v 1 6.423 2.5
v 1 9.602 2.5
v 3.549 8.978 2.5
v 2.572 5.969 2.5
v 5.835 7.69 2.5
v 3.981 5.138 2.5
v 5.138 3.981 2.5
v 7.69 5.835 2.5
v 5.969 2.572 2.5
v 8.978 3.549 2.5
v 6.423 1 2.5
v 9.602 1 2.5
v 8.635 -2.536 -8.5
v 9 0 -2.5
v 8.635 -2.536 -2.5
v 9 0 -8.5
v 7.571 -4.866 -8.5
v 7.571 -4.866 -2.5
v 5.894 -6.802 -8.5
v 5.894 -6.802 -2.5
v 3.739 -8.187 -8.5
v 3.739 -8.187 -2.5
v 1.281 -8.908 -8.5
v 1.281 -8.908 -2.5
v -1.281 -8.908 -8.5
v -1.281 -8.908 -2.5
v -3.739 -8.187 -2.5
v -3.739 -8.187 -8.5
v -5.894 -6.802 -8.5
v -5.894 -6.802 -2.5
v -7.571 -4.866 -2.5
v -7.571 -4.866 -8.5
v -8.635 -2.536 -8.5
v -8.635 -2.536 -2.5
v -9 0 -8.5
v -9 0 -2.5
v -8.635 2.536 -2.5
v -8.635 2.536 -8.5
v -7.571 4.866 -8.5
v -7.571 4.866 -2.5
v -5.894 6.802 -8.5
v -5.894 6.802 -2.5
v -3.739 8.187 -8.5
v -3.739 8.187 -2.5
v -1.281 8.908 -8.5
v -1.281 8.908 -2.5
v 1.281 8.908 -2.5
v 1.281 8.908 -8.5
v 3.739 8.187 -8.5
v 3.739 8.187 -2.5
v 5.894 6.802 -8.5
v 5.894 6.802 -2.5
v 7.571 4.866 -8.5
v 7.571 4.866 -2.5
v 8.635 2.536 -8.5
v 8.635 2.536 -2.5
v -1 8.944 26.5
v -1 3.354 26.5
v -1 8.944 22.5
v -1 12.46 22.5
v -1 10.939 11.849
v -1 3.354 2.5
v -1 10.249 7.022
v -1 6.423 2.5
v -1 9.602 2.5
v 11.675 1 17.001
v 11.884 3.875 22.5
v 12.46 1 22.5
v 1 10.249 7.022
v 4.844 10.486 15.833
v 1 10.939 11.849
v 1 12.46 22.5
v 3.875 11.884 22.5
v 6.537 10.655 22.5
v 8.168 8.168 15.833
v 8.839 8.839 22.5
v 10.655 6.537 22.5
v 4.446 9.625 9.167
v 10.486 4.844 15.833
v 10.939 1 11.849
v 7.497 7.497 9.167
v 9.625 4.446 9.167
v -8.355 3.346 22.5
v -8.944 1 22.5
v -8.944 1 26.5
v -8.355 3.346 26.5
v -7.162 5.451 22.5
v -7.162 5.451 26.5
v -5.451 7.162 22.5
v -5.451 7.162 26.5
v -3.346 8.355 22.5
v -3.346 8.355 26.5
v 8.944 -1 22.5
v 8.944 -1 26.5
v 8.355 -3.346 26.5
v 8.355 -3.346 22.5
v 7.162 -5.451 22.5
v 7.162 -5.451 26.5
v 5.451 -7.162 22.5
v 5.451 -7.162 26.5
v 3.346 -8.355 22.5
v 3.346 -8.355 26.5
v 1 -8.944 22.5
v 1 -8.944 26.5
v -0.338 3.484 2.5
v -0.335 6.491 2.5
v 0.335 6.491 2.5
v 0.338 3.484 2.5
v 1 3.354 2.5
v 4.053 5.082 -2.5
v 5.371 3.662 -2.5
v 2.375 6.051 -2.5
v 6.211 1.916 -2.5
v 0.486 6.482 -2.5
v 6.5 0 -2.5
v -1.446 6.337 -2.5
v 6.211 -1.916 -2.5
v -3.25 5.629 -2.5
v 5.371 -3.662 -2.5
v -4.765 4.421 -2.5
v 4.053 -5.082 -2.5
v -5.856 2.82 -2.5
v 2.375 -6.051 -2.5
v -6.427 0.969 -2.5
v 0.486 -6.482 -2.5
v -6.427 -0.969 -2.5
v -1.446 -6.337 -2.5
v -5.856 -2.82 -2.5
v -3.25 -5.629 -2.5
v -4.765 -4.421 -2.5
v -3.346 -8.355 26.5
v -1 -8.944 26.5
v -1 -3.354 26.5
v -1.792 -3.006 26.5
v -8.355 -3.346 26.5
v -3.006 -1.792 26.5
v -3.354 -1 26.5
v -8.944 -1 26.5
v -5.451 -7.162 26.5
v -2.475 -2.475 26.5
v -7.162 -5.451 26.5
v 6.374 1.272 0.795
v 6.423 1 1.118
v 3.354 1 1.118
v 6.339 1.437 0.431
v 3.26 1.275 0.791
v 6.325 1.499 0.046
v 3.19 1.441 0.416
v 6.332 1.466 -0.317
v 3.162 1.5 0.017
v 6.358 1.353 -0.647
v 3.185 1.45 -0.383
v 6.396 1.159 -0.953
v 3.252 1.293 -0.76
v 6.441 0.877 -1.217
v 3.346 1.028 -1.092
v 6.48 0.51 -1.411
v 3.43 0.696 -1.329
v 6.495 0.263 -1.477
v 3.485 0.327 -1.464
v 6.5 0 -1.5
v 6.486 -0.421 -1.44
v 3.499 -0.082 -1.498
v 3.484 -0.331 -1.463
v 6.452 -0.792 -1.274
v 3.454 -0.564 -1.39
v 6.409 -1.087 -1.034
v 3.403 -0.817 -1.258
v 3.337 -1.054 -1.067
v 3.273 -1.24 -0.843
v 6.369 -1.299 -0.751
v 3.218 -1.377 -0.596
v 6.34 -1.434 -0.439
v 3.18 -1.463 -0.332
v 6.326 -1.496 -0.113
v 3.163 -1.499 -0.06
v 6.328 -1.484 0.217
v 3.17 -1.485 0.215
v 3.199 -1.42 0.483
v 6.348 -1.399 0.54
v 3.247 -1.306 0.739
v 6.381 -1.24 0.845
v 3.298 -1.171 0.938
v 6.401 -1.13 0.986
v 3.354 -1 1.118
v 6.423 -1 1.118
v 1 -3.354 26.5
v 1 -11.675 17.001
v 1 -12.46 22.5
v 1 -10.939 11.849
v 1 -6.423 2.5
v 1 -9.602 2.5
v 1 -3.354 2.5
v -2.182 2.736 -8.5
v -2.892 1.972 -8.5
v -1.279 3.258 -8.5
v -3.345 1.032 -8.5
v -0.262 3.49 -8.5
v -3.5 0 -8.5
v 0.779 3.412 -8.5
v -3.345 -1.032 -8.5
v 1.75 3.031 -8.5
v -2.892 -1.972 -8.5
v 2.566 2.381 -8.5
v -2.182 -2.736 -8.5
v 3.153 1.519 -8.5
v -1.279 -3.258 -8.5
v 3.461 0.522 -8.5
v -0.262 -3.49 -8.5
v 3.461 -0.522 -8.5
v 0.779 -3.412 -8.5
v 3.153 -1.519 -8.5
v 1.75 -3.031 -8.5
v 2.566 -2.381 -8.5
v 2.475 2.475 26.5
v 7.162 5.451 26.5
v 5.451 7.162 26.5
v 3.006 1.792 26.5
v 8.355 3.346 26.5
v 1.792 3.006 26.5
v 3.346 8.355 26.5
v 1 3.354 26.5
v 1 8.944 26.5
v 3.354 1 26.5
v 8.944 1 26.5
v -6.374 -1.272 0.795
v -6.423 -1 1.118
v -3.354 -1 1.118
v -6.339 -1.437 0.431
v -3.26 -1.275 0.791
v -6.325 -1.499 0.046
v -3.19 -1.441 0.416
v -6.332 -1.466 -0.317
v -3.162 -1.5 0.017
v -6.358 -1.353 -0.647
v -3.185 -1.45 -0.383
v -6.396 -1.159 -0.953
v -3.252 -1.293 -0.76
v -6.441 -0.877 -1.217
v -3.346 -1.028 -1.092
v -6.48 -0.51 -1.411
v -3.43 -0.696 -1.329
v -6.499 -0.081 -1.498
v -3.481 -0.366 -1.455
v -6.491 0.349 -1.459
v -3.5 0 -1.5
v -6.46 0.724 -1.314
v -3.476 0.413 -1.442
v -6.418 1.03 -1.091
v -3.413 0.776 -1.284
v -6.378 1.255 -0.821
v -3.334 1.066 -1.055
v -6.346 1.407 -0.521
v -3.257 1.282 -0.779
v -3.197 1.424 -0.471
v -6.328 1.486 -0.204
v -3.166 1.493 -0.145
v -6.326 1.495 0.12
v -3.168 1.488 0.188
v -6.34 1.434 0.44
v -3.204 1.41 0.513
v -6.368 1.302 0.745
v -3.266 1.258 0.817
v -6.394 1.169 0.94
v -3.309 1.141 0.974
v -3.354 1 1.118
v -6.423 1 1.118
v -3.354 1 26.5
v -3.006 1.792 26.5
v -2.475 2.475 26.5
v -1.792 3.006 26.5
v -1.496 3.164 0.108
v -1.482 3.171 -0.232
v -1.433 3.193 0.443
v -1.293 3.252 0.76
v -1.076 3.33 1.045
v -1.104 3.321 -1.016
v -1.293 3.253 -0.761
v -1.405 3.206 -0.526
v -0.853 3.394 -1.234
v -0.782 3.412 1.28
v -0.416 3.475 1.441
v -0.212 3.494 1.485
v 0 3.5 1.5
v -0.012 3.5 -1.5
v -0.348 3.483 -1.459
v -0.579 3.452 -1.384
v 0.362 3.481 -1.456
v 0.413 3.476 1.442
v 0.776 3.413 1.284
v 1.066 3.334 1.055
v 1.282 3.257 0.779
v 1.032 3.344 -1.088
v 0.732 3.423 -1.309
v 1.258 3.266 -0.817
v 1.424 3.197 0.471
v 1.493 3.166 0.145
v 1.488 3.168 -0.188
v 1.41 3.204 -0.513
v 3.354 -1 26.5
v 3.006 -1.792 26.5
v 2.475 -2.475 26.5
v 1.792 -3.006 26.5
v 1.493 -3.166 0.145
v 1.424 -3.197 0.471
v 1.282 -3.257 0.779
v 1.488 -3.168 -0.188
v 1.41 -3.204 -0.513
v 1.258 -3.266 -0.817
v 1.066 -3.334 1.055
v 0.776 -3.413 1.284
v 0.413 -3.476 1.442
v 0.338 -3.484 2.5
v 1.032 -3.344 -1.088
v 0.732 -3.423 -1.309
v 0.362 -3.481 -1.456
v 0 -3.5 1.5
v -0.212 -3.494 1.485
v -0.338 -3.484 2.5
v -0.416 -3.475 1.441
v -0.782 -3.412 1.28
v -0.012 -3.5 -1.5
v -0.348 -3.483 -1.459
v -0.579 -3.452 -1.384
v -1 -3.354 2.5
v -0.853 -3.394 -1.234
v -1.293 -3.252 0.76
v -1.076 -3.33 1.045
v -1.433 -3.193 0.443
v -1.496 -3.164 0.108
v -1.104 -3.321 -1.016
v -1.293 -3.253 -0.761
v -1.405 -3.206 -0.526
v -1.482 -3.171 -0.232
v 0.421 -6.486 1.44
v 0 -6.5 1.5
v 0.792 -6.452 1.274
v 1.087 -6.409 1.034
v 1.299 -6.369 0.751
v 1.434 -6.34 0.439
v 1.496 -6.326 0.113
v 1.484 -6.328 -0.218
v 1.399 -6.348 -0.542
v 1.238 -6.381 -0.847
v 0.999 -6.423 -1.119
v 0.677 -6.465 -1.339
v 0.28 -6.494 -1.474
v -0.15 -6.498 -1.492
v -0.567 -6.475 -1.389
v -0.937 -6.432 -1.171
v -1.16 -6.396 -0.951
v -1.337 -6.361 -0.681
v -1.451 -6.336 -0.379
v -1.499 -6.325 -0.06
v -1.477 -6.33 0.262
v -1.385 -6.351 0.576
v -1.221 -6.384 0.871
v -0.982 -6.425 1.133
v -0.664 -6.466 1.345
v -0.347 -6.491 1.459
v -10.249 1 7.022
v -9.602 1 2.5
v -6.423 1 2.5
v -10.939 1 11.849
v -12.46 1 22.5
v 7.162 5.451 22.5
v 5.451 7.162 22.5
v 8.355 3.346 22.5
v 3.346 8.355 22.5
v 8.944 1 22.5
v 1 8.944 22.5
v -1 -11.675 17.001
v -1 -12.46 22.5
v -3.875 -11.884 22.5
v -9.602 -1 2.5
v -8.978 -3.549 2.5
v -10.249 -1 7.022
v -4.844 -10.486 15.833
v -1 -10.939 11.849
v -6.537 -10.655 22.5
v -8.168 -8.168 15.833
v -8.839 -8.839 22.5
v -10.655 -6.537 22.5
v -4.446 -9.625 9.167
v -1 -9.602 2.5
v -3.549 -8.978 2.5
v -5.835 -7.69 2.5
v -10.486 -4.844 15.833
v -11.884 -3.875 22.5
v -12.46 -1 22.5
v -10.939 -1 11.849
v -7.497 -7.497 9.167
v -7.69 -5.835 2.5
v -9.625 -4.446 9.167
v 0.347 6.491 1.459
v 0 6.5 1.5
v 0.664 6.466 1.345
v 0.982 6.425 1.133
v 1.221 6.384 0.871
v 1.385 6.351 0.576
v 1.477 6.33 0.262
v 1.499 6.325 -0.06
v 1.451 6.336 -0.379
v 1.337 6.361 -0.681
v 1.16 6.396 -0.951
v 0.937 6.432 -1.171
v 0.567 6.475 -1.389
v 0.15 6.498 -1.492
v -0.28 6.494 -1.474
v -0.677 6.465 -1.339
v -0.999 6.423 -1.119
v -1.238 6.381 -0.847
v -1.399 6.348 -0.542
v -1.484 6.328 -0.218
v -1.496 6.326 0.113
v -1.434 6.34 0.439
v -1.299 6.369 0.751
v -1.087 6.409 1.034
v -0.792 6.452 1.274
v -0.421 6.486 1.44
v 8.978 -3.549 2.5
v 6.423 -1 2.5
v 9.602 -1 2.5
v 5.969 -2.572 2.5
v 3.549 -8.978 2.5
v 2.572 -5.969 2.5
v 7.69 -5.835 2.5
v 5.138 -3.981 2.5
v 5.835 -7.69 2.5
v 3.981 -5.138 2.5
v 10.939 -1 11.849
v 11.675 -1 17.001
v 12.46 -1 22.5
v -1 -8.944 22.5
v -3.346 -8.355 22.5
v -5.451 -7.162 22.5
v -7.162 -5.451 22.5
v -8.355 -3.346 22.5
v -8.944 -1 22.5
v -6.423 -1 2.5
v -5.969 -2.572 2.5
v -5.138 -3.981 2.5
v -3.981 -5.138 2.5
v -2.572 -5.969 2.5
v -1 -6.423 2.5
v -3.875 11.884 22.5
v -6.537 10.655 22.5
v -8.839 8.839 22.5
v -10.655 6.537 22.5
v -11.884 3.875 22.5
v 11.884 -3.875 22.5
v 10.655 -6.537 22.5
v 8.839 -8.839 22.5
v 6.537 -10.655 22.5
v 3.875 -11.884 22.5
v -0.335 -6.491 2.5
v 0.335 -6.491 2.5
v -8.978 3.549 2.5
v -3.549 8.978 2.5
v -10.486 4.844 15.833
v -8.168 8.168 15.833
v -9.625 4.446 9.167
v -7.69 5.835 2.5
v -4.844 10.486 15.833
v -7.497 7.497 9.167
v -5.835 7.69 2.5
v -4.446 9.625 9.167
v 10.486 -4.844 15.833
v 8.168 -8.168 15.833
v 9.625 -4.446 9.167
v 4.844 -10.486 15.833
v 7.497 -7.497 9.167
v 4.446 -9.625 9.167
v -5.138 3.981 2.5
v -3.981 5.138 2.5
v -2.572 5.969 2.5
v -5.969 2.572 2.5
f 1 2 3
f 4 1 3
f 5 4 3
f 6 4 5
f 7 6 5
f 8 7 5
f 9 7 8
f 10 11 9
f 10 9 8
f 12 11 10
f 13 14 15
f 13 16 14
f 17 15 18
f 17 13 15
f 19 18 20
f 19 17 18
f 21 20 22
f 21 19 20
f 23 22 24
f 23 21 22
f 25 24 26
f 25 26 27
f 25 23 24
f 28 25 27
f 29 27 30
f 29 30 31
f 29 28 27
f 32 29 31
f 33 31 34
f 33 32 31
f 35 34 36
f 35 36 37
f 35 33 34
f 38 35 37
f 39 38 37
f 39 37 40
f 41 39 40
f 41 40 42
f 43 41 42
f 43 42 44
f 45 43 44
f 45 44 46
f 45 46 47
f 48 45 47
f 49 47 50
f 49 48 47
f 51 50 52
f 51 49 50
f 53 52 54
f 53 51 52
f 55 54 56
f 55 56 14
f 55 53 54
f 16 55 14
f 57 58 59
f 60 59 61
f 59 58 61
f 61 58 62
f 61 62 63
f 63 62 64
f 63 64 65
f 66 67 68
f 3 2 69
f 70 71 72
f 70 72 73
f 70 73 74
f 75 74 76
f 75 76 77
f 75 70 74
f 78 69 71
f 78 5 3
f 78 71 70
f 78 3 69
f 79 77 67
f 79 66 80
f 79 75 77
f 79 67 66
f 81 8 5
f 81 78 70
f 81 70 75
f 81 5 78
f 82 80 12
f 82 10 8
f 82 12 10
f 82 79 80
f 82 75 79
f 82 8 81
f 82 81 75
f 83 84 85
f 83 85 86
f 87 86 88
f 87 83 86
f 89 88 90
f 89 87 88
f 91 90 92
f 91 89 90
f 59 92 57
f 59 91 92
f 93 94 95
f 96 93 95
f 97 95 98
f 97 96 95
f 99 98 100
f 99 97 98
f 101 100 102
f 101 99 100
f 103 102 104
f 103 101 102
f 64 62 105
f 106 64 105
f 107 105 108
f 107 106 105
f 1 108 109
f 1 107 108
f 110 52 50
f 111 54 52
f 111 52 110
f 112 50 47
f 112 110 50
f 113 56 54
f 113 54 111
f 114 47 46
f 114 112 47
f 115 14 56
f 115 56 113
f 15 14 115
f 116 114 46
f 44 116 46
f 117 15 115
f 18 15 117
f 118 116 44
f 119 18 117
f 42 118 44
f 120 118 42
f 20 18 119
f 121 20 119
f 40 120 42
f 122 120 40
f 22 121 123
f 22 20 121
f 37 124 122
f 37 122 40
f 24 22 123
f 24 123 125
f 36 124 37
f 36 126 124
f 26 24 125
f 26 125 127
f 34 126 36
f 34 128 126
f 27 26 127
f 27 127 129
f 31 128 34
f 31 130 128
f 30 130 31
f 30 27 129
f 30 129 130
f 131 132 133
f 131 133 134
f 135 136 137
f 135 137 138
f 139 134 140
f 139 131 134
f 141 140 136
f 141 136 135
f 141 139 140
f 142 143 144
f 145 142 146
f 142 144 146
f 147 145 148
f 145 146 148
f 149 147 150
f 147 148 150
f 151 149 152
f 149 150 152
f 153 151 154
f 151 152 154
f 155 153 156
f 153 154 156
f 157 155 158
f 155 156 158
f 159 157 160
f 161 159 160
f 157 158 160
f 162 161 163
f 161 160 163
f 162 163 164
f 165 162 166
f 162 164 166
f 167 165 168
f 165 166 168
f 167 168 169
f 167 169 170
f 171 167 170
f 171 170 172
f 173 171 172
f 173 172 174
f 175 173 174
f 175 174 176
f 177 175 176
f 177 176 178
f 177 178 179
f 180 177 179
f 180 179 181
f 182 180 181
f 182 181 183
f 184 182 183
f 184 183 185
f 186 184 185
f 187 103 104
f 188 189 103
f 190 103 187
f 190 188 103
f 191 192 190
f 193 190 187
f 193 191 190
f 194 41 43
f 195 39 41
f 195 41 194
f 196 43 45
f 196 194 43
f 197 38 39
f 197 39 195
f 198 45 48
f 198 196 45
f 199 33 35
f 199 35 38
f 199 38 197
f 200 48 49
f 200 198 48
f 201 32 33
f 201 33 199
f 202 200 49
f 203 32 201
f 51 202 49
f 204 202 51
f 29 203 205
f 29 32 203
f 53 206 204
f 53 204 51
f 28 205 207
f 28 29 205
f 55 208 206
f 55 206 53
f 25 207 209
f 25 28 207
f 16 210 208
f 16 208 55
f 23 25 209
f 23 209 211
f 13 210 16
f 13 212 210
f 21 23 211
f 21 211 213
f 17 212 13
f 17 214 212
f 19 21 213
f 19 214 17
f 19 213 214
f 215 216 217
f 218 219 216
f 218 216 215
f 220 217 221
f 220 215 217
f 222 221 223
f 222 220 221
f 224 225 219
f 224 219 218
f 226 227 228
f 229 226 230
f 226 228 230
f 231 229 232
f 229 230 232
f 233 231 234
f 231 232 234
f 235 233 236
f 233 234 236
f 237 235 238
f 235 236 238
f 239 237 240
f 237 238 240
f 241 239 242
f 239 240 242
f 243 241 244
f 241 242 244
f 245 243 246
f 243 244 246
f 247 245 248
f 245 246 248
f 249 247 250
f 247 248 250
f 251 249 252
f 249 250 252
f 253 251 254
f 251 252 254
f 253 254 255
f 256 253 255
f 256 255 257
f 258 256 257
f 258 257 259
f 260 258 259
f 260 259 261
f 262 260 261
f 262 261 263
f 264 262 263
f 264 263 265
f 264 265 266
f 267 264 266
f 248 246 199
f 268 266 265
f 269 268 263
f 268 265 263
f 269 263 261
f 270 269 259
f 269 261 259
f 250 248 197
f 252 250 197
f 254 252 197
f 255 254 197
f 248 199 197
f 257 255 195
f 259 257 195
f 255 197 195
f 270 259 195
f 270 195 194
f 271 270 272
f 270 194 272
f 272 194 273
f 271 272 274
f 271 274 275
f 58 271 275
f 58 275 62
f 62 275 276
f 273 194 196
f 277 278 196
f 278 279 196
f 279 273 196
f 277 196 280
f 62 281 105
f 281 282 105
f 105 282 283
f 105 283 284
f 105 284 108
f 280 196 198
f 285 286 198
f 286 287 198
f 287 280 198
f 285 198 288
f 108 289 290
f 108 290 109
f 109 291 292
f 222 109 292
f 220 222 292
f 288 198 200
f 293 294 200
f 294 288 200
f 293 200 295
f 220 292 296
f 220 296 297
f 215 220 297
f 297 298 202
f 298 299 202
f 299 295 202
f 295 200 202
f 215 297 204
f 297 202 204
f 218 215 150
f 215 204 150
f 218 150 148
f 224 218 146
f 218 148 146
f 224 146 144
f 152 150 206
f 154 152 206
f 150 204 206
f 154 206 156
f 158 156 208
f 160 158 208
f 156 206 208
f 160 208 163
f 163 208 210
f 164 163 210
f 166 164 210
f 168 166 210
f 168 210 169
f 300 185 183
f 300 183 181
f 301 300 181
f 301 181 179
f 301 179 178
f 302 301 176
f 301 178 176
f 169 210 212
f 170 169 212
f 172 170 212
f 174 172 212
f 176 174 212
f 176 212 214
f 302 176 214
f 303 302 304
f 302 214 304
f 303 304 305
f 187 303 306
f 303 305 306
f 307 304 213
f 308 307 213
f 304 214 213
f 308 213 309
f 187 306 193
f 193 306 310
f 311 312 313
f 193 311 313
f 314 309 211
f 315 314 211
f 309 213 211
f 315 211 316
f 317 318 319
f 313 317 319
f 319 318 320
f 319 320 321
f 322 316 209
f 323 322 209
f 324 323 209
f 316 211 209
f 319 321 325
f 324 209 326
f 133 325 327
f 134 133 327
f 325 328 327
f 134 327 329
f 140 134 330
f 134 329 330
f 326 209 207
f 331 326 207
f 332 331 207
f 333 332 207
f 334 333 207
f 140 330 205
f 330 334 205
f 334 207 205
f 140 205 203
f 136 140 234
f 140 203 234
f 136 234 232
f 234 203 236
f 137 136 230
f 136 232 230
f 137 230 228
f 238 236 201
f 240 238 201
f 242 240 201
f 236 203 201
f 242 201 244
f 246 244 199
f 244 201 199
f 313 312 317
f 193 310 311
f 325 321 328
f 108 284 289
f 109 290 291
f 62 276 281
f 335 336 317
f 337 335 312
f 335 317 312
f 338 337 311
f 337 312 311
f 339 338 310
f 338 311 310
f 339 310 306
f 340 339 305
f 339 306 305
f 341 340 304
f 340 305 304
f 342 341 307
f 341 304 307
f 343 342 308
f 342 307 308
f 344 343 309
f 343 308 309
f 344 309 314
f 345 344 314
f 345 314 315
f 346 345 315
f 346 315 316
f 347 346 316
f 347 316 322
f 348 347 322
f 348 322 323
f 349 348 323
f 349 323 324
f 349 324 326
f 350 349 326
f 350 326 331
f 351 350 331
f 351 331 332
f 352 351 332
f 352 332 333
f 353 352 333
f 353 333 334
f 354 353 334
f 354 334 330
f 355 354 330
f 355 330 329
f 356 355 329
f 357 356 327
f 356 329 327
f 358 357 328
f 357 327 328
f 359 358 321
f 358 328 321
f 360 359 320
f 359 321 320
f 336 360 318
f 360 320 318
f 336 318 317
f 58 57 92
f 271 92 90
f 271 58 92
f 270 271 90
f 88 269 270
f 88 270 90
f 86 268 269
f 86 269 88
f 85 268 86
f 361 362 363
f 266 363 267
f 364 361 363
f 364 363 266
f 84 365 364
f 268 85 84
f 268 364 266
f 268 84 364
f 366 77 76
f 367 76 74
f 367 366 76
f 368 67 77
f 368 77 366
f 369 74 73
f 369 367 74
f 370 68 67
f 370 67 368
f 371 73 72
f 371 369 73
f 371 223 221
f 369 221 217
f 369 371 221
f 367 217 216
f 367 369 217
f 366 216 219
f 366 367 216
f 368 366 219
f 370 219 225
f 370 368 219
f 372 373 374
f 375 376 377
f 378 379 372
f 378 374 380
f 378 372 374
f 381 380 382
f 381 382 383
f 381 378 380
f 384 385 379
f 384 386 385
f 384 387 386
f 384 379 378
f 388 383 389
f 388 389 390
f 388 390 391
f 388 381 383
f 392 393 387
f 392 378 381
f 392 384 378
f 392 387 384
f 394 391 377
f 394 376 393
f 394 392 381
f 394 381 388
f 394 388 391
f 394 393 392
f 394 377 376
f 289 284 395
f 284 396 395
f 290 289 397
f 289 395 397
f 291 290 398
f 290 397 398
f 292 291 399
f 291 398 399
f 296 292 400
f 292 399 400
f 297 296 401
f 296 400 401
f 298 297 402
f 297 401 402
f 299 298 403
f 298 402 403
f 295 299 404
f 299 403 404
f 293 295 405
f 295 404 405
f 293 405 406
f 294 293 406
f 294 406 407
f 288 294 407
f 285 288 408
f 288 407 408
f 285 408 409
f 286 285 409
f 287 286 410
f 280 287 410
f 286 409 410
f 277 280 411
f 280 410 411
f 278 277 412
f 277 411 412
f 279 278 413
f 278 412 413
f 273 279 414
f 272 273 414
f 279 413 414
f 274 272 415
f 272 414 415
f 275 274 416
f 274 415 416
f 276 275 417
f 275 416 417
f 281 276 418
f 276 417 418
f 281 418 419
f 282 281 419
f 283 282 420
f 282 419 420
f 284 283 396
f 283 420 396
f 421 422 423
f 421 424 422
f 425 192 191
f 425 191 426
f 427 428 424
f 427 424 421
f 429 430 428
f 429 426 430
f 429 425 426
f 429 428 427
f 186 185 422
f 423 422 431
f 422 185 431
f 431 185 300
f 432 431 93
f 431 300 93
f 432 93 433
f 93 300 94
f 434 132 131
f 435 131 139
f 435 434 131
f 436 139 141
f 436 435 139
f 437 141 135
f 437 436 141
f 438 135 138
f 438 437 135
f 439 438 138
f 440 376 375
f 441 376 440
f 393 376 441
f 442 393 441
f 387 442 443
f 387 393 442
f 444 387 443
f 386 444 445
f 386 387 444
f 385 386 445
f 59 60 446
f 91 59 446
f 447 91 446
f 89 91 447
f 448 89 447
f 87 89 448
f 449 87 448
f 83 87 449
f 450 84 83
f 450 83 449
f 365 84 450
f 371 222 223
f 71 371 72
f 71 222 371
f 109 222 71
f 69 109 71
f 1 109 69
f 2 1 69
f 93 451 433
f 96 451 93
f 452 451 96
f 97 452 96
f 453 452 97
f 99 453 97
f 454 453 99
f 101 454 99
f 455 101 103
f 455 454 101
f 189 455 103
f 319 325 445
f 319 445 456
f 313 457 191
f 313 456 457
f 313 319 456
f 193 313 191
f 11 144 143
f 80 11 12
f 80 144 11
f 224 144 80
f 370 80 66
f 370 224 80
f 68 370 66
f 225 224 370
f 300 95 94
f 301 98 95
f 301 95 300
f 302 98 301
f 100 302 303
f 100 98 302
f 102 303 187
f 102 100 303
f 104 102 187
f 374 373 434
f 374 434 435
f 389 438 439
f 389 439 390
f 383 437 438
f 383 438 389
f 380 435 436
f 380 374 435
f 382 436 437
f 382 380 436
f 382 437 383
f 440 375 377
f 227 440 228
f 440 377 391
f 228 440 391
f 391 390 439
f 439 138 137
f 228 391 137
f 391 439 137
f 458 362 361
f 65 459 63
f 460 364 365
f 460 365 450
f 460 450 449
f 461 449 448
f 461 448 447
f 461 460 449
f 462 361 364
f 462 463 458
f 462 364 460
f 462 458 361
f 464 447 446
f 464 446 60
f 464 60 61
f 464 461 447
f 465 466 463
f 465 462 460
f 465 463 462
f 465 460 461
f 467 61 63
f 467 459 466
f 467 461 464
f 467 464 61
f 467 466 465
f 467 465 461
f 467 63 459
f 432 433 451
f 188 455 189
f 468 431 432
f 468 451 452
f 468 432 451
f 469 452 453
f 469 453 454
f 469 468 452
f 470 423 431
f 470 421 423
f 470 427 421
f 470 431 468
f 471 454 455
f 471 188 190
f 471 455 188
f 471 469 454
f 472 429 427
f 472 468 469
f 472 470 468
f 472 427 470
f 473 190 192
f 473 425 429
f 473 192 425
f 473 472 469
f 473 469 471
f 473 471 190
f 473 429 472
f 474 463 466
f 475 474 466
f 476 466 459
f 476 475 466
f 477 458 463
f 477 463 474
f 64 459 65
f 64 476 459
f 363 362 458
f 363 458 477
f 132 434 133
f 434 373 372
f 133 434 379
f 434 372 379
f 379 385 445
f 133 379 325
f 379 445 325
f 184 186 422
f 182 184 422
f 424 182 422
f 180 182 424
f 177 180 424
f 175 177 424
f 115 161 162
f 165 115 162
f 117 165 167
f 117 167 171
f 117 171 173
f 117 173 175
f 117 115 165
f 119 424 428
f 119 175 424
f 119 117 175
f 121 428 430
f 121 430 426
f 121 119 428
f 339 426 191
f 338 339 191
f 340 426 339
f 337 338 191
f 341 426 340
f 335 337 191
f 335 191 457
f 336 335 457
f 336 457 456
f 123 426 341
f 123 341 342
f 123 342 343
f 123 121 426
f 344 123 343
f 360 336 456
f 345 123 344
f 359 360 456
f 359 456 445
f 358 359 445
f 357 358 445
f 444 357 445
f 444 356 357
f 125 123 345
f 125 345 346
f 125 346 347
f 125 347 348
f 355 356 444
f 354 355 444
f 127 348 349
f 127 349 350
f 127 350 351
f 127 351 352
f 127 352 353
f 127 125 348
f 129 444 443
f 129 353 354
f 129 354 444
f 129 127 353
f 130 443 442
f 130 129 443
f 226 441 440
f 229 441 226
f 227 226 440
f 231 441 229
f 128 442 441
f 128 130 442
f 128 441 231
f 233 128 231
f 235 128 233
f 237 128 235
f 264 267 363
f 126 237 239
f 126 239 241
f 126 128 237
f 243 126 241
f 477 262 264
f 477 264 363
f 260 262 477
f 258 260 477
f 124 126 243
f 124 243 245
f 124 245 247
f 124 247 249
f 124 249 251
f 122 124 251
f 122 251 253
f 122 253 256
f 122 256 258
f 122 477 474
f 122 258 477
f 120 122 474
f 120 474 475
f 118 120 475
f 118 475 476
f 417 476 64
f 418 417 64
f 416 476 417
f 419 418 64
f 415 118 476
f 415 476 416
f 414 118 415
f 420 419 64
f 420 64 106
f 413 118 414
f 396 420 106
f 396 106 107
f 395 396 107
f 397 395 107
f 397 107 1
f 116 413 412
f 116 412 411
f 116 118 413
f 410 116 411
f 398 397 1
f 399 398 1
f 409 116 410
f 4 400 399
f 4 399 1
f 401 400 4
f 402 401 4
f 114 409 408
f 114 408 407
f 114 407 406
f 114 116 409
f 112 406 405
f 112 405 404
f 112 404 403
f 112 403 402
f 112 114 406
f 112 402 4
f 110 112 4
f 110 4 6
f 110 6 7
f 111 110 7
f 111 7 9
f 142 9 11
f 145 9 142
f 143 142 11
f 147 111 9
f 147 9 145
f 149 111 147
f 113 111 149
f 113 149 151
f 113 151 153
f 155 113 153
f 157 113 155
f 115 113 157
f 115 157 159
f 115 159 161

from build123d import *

# Parameters (mm, degrees)
SKETCH_2_R               = 1.5
CUT_EXTRUDE_1_DEPTH      = 10
PATTERN_CIRCULAR_1_COUNT = 4
CUT_EXTRUDE_3_REACH      = 41.211
SKETCH_3_R               = 3.5
CUT_EXTRUDE_4_REACH      = 41.211
CUT_EXTRUDE_4_END_RADIUS = 1.5
SKETCH_4_W               = 31.367872694
SKETCH_4_H               = 2
CUT_EXTRUDE_START        = -24
SKETCH_5_W               = 2
SKETCH_5_H               = 28.424190946
CUT_EXTRUDE_5_DEPTH      = 24


with BuildPart() as part:
    # 草图1 → 旋转1 (revolve)
    with BuildSketch(Plane(origin=(0, 0, 0), x_dir=(0, 0, -1), z_dir=(1, 0, 0)), mode=Mode.PRIVATE) as revolve_1_sk:
        Polygon((-2.5, 6.5), (2.5, 6.5), (2.5, 9), (8.5, 9), (8.5, 0), (-26.5, 0), (-26.5, 9), (-22.5, 9), (-22.5, 12.5), (-2.5, 9.653578486), align=None)
    revolve(revolve_1_sk.sketch.rotate(Axis((0, 0, 115.12599891), (0, 0, -1)), 90), axis=Axis((0, 0, 115.12599891), (0, 0, -1)))

    # 草图2 → 切除-拉伸1 (cut)
    with BuildSketch(Plane(origin=(0, 0, 0), x_dir=(1, 0, 0), z_dir=(0, 1, 0))):
        with Locations(Location((0, 0, 0), (0, 0, 270))):
            Circle(SKETCH_2_R)
    cut_extrude_1 = extrude(amount=-CUT_EXTRUDE_1_DEPTH, mode=Mode.SUBTRACT)

    # 阵列(圆周)1: 切除-拉伸1 ×4 about axis
    pattern_circular_1_axis = Axis((0, 0, 2.5), (0, 0, 1))
    for i in range(1, PATTERN_CIRCULAR_1_COUNT):
        add(cut_extrude_1.rotate(pattern_circular_1_axis, i * 360 / PATTERN_CIRCULAR_1_COUNT), mode=Mode.SUBTRACT)

    # 草图3 → 切除-拉伸3 (cut, up to next)
    with BuildSketch(Plane(origin=(0, 0, -8.5), x_dir=(-1, 0, 0), z_dir=(0, 0, -1)), mode=Mode.PRIVATE) as cut_extrude_3_sk1:
        Circle(SKETCH_3_R)
    cut_extrude_3_tool1 = extrude(cut_extrude_3_sk1.sketch, amount=-CUT_EXTRUDE_3_REACH, mode=Mode.PRIVATE) & part.part
    add(cut_extrude_3_tool1.solids().sort_by_distance((0, 0, -8.5))[0], mode=Mode.SUBTRACT)

    # 切除-拉伸4: up to this cylinder (the profile starts outside it)
    cut_extrude_4_end = Plane(origin=(0, 0, 0), z_dir=(-1, 0, 0)) * Cylinder(CUT_EXTRUDE_4_END_RADIUS, 86.422, mode=Mode.PRIVATE)
    # 草图4 → 切除-拉伸4 (cut, up to the surface)
    with BuildSketch(Plane.XY.offset(26.5), mode=Mode.PRIVATE) as cut_extrude_4_sk1:
        Rectangle(SKETCH_4_W, SKETCH_4_H)
    cut_extrude_4_tool1 = extrude(cut_extrude_4_sk1.sketch, amount=-CUT_EXTRUDE_4_REACH, mode=Mode.PRIVATE) - cut_extrude_4_end
    add(cut_extrude_4_tool1.solids().sort_by_distance((0, 0, 26.5))[0], mode=Mode.SUBTRACT)

    # 草图5 → 切除-拉伸5 (cut)
    with BuildSketch(Plane.XY.offset(26.5).offset(CUT_EXTRUDE_START)):
        Rectangle(SKETCH_5_W, SKETCH_5_H)
    extrude(amount=CUT_EXTRUDE_5_DEPTH, mode=Mode.SUBTRACT)


solid = part.part
